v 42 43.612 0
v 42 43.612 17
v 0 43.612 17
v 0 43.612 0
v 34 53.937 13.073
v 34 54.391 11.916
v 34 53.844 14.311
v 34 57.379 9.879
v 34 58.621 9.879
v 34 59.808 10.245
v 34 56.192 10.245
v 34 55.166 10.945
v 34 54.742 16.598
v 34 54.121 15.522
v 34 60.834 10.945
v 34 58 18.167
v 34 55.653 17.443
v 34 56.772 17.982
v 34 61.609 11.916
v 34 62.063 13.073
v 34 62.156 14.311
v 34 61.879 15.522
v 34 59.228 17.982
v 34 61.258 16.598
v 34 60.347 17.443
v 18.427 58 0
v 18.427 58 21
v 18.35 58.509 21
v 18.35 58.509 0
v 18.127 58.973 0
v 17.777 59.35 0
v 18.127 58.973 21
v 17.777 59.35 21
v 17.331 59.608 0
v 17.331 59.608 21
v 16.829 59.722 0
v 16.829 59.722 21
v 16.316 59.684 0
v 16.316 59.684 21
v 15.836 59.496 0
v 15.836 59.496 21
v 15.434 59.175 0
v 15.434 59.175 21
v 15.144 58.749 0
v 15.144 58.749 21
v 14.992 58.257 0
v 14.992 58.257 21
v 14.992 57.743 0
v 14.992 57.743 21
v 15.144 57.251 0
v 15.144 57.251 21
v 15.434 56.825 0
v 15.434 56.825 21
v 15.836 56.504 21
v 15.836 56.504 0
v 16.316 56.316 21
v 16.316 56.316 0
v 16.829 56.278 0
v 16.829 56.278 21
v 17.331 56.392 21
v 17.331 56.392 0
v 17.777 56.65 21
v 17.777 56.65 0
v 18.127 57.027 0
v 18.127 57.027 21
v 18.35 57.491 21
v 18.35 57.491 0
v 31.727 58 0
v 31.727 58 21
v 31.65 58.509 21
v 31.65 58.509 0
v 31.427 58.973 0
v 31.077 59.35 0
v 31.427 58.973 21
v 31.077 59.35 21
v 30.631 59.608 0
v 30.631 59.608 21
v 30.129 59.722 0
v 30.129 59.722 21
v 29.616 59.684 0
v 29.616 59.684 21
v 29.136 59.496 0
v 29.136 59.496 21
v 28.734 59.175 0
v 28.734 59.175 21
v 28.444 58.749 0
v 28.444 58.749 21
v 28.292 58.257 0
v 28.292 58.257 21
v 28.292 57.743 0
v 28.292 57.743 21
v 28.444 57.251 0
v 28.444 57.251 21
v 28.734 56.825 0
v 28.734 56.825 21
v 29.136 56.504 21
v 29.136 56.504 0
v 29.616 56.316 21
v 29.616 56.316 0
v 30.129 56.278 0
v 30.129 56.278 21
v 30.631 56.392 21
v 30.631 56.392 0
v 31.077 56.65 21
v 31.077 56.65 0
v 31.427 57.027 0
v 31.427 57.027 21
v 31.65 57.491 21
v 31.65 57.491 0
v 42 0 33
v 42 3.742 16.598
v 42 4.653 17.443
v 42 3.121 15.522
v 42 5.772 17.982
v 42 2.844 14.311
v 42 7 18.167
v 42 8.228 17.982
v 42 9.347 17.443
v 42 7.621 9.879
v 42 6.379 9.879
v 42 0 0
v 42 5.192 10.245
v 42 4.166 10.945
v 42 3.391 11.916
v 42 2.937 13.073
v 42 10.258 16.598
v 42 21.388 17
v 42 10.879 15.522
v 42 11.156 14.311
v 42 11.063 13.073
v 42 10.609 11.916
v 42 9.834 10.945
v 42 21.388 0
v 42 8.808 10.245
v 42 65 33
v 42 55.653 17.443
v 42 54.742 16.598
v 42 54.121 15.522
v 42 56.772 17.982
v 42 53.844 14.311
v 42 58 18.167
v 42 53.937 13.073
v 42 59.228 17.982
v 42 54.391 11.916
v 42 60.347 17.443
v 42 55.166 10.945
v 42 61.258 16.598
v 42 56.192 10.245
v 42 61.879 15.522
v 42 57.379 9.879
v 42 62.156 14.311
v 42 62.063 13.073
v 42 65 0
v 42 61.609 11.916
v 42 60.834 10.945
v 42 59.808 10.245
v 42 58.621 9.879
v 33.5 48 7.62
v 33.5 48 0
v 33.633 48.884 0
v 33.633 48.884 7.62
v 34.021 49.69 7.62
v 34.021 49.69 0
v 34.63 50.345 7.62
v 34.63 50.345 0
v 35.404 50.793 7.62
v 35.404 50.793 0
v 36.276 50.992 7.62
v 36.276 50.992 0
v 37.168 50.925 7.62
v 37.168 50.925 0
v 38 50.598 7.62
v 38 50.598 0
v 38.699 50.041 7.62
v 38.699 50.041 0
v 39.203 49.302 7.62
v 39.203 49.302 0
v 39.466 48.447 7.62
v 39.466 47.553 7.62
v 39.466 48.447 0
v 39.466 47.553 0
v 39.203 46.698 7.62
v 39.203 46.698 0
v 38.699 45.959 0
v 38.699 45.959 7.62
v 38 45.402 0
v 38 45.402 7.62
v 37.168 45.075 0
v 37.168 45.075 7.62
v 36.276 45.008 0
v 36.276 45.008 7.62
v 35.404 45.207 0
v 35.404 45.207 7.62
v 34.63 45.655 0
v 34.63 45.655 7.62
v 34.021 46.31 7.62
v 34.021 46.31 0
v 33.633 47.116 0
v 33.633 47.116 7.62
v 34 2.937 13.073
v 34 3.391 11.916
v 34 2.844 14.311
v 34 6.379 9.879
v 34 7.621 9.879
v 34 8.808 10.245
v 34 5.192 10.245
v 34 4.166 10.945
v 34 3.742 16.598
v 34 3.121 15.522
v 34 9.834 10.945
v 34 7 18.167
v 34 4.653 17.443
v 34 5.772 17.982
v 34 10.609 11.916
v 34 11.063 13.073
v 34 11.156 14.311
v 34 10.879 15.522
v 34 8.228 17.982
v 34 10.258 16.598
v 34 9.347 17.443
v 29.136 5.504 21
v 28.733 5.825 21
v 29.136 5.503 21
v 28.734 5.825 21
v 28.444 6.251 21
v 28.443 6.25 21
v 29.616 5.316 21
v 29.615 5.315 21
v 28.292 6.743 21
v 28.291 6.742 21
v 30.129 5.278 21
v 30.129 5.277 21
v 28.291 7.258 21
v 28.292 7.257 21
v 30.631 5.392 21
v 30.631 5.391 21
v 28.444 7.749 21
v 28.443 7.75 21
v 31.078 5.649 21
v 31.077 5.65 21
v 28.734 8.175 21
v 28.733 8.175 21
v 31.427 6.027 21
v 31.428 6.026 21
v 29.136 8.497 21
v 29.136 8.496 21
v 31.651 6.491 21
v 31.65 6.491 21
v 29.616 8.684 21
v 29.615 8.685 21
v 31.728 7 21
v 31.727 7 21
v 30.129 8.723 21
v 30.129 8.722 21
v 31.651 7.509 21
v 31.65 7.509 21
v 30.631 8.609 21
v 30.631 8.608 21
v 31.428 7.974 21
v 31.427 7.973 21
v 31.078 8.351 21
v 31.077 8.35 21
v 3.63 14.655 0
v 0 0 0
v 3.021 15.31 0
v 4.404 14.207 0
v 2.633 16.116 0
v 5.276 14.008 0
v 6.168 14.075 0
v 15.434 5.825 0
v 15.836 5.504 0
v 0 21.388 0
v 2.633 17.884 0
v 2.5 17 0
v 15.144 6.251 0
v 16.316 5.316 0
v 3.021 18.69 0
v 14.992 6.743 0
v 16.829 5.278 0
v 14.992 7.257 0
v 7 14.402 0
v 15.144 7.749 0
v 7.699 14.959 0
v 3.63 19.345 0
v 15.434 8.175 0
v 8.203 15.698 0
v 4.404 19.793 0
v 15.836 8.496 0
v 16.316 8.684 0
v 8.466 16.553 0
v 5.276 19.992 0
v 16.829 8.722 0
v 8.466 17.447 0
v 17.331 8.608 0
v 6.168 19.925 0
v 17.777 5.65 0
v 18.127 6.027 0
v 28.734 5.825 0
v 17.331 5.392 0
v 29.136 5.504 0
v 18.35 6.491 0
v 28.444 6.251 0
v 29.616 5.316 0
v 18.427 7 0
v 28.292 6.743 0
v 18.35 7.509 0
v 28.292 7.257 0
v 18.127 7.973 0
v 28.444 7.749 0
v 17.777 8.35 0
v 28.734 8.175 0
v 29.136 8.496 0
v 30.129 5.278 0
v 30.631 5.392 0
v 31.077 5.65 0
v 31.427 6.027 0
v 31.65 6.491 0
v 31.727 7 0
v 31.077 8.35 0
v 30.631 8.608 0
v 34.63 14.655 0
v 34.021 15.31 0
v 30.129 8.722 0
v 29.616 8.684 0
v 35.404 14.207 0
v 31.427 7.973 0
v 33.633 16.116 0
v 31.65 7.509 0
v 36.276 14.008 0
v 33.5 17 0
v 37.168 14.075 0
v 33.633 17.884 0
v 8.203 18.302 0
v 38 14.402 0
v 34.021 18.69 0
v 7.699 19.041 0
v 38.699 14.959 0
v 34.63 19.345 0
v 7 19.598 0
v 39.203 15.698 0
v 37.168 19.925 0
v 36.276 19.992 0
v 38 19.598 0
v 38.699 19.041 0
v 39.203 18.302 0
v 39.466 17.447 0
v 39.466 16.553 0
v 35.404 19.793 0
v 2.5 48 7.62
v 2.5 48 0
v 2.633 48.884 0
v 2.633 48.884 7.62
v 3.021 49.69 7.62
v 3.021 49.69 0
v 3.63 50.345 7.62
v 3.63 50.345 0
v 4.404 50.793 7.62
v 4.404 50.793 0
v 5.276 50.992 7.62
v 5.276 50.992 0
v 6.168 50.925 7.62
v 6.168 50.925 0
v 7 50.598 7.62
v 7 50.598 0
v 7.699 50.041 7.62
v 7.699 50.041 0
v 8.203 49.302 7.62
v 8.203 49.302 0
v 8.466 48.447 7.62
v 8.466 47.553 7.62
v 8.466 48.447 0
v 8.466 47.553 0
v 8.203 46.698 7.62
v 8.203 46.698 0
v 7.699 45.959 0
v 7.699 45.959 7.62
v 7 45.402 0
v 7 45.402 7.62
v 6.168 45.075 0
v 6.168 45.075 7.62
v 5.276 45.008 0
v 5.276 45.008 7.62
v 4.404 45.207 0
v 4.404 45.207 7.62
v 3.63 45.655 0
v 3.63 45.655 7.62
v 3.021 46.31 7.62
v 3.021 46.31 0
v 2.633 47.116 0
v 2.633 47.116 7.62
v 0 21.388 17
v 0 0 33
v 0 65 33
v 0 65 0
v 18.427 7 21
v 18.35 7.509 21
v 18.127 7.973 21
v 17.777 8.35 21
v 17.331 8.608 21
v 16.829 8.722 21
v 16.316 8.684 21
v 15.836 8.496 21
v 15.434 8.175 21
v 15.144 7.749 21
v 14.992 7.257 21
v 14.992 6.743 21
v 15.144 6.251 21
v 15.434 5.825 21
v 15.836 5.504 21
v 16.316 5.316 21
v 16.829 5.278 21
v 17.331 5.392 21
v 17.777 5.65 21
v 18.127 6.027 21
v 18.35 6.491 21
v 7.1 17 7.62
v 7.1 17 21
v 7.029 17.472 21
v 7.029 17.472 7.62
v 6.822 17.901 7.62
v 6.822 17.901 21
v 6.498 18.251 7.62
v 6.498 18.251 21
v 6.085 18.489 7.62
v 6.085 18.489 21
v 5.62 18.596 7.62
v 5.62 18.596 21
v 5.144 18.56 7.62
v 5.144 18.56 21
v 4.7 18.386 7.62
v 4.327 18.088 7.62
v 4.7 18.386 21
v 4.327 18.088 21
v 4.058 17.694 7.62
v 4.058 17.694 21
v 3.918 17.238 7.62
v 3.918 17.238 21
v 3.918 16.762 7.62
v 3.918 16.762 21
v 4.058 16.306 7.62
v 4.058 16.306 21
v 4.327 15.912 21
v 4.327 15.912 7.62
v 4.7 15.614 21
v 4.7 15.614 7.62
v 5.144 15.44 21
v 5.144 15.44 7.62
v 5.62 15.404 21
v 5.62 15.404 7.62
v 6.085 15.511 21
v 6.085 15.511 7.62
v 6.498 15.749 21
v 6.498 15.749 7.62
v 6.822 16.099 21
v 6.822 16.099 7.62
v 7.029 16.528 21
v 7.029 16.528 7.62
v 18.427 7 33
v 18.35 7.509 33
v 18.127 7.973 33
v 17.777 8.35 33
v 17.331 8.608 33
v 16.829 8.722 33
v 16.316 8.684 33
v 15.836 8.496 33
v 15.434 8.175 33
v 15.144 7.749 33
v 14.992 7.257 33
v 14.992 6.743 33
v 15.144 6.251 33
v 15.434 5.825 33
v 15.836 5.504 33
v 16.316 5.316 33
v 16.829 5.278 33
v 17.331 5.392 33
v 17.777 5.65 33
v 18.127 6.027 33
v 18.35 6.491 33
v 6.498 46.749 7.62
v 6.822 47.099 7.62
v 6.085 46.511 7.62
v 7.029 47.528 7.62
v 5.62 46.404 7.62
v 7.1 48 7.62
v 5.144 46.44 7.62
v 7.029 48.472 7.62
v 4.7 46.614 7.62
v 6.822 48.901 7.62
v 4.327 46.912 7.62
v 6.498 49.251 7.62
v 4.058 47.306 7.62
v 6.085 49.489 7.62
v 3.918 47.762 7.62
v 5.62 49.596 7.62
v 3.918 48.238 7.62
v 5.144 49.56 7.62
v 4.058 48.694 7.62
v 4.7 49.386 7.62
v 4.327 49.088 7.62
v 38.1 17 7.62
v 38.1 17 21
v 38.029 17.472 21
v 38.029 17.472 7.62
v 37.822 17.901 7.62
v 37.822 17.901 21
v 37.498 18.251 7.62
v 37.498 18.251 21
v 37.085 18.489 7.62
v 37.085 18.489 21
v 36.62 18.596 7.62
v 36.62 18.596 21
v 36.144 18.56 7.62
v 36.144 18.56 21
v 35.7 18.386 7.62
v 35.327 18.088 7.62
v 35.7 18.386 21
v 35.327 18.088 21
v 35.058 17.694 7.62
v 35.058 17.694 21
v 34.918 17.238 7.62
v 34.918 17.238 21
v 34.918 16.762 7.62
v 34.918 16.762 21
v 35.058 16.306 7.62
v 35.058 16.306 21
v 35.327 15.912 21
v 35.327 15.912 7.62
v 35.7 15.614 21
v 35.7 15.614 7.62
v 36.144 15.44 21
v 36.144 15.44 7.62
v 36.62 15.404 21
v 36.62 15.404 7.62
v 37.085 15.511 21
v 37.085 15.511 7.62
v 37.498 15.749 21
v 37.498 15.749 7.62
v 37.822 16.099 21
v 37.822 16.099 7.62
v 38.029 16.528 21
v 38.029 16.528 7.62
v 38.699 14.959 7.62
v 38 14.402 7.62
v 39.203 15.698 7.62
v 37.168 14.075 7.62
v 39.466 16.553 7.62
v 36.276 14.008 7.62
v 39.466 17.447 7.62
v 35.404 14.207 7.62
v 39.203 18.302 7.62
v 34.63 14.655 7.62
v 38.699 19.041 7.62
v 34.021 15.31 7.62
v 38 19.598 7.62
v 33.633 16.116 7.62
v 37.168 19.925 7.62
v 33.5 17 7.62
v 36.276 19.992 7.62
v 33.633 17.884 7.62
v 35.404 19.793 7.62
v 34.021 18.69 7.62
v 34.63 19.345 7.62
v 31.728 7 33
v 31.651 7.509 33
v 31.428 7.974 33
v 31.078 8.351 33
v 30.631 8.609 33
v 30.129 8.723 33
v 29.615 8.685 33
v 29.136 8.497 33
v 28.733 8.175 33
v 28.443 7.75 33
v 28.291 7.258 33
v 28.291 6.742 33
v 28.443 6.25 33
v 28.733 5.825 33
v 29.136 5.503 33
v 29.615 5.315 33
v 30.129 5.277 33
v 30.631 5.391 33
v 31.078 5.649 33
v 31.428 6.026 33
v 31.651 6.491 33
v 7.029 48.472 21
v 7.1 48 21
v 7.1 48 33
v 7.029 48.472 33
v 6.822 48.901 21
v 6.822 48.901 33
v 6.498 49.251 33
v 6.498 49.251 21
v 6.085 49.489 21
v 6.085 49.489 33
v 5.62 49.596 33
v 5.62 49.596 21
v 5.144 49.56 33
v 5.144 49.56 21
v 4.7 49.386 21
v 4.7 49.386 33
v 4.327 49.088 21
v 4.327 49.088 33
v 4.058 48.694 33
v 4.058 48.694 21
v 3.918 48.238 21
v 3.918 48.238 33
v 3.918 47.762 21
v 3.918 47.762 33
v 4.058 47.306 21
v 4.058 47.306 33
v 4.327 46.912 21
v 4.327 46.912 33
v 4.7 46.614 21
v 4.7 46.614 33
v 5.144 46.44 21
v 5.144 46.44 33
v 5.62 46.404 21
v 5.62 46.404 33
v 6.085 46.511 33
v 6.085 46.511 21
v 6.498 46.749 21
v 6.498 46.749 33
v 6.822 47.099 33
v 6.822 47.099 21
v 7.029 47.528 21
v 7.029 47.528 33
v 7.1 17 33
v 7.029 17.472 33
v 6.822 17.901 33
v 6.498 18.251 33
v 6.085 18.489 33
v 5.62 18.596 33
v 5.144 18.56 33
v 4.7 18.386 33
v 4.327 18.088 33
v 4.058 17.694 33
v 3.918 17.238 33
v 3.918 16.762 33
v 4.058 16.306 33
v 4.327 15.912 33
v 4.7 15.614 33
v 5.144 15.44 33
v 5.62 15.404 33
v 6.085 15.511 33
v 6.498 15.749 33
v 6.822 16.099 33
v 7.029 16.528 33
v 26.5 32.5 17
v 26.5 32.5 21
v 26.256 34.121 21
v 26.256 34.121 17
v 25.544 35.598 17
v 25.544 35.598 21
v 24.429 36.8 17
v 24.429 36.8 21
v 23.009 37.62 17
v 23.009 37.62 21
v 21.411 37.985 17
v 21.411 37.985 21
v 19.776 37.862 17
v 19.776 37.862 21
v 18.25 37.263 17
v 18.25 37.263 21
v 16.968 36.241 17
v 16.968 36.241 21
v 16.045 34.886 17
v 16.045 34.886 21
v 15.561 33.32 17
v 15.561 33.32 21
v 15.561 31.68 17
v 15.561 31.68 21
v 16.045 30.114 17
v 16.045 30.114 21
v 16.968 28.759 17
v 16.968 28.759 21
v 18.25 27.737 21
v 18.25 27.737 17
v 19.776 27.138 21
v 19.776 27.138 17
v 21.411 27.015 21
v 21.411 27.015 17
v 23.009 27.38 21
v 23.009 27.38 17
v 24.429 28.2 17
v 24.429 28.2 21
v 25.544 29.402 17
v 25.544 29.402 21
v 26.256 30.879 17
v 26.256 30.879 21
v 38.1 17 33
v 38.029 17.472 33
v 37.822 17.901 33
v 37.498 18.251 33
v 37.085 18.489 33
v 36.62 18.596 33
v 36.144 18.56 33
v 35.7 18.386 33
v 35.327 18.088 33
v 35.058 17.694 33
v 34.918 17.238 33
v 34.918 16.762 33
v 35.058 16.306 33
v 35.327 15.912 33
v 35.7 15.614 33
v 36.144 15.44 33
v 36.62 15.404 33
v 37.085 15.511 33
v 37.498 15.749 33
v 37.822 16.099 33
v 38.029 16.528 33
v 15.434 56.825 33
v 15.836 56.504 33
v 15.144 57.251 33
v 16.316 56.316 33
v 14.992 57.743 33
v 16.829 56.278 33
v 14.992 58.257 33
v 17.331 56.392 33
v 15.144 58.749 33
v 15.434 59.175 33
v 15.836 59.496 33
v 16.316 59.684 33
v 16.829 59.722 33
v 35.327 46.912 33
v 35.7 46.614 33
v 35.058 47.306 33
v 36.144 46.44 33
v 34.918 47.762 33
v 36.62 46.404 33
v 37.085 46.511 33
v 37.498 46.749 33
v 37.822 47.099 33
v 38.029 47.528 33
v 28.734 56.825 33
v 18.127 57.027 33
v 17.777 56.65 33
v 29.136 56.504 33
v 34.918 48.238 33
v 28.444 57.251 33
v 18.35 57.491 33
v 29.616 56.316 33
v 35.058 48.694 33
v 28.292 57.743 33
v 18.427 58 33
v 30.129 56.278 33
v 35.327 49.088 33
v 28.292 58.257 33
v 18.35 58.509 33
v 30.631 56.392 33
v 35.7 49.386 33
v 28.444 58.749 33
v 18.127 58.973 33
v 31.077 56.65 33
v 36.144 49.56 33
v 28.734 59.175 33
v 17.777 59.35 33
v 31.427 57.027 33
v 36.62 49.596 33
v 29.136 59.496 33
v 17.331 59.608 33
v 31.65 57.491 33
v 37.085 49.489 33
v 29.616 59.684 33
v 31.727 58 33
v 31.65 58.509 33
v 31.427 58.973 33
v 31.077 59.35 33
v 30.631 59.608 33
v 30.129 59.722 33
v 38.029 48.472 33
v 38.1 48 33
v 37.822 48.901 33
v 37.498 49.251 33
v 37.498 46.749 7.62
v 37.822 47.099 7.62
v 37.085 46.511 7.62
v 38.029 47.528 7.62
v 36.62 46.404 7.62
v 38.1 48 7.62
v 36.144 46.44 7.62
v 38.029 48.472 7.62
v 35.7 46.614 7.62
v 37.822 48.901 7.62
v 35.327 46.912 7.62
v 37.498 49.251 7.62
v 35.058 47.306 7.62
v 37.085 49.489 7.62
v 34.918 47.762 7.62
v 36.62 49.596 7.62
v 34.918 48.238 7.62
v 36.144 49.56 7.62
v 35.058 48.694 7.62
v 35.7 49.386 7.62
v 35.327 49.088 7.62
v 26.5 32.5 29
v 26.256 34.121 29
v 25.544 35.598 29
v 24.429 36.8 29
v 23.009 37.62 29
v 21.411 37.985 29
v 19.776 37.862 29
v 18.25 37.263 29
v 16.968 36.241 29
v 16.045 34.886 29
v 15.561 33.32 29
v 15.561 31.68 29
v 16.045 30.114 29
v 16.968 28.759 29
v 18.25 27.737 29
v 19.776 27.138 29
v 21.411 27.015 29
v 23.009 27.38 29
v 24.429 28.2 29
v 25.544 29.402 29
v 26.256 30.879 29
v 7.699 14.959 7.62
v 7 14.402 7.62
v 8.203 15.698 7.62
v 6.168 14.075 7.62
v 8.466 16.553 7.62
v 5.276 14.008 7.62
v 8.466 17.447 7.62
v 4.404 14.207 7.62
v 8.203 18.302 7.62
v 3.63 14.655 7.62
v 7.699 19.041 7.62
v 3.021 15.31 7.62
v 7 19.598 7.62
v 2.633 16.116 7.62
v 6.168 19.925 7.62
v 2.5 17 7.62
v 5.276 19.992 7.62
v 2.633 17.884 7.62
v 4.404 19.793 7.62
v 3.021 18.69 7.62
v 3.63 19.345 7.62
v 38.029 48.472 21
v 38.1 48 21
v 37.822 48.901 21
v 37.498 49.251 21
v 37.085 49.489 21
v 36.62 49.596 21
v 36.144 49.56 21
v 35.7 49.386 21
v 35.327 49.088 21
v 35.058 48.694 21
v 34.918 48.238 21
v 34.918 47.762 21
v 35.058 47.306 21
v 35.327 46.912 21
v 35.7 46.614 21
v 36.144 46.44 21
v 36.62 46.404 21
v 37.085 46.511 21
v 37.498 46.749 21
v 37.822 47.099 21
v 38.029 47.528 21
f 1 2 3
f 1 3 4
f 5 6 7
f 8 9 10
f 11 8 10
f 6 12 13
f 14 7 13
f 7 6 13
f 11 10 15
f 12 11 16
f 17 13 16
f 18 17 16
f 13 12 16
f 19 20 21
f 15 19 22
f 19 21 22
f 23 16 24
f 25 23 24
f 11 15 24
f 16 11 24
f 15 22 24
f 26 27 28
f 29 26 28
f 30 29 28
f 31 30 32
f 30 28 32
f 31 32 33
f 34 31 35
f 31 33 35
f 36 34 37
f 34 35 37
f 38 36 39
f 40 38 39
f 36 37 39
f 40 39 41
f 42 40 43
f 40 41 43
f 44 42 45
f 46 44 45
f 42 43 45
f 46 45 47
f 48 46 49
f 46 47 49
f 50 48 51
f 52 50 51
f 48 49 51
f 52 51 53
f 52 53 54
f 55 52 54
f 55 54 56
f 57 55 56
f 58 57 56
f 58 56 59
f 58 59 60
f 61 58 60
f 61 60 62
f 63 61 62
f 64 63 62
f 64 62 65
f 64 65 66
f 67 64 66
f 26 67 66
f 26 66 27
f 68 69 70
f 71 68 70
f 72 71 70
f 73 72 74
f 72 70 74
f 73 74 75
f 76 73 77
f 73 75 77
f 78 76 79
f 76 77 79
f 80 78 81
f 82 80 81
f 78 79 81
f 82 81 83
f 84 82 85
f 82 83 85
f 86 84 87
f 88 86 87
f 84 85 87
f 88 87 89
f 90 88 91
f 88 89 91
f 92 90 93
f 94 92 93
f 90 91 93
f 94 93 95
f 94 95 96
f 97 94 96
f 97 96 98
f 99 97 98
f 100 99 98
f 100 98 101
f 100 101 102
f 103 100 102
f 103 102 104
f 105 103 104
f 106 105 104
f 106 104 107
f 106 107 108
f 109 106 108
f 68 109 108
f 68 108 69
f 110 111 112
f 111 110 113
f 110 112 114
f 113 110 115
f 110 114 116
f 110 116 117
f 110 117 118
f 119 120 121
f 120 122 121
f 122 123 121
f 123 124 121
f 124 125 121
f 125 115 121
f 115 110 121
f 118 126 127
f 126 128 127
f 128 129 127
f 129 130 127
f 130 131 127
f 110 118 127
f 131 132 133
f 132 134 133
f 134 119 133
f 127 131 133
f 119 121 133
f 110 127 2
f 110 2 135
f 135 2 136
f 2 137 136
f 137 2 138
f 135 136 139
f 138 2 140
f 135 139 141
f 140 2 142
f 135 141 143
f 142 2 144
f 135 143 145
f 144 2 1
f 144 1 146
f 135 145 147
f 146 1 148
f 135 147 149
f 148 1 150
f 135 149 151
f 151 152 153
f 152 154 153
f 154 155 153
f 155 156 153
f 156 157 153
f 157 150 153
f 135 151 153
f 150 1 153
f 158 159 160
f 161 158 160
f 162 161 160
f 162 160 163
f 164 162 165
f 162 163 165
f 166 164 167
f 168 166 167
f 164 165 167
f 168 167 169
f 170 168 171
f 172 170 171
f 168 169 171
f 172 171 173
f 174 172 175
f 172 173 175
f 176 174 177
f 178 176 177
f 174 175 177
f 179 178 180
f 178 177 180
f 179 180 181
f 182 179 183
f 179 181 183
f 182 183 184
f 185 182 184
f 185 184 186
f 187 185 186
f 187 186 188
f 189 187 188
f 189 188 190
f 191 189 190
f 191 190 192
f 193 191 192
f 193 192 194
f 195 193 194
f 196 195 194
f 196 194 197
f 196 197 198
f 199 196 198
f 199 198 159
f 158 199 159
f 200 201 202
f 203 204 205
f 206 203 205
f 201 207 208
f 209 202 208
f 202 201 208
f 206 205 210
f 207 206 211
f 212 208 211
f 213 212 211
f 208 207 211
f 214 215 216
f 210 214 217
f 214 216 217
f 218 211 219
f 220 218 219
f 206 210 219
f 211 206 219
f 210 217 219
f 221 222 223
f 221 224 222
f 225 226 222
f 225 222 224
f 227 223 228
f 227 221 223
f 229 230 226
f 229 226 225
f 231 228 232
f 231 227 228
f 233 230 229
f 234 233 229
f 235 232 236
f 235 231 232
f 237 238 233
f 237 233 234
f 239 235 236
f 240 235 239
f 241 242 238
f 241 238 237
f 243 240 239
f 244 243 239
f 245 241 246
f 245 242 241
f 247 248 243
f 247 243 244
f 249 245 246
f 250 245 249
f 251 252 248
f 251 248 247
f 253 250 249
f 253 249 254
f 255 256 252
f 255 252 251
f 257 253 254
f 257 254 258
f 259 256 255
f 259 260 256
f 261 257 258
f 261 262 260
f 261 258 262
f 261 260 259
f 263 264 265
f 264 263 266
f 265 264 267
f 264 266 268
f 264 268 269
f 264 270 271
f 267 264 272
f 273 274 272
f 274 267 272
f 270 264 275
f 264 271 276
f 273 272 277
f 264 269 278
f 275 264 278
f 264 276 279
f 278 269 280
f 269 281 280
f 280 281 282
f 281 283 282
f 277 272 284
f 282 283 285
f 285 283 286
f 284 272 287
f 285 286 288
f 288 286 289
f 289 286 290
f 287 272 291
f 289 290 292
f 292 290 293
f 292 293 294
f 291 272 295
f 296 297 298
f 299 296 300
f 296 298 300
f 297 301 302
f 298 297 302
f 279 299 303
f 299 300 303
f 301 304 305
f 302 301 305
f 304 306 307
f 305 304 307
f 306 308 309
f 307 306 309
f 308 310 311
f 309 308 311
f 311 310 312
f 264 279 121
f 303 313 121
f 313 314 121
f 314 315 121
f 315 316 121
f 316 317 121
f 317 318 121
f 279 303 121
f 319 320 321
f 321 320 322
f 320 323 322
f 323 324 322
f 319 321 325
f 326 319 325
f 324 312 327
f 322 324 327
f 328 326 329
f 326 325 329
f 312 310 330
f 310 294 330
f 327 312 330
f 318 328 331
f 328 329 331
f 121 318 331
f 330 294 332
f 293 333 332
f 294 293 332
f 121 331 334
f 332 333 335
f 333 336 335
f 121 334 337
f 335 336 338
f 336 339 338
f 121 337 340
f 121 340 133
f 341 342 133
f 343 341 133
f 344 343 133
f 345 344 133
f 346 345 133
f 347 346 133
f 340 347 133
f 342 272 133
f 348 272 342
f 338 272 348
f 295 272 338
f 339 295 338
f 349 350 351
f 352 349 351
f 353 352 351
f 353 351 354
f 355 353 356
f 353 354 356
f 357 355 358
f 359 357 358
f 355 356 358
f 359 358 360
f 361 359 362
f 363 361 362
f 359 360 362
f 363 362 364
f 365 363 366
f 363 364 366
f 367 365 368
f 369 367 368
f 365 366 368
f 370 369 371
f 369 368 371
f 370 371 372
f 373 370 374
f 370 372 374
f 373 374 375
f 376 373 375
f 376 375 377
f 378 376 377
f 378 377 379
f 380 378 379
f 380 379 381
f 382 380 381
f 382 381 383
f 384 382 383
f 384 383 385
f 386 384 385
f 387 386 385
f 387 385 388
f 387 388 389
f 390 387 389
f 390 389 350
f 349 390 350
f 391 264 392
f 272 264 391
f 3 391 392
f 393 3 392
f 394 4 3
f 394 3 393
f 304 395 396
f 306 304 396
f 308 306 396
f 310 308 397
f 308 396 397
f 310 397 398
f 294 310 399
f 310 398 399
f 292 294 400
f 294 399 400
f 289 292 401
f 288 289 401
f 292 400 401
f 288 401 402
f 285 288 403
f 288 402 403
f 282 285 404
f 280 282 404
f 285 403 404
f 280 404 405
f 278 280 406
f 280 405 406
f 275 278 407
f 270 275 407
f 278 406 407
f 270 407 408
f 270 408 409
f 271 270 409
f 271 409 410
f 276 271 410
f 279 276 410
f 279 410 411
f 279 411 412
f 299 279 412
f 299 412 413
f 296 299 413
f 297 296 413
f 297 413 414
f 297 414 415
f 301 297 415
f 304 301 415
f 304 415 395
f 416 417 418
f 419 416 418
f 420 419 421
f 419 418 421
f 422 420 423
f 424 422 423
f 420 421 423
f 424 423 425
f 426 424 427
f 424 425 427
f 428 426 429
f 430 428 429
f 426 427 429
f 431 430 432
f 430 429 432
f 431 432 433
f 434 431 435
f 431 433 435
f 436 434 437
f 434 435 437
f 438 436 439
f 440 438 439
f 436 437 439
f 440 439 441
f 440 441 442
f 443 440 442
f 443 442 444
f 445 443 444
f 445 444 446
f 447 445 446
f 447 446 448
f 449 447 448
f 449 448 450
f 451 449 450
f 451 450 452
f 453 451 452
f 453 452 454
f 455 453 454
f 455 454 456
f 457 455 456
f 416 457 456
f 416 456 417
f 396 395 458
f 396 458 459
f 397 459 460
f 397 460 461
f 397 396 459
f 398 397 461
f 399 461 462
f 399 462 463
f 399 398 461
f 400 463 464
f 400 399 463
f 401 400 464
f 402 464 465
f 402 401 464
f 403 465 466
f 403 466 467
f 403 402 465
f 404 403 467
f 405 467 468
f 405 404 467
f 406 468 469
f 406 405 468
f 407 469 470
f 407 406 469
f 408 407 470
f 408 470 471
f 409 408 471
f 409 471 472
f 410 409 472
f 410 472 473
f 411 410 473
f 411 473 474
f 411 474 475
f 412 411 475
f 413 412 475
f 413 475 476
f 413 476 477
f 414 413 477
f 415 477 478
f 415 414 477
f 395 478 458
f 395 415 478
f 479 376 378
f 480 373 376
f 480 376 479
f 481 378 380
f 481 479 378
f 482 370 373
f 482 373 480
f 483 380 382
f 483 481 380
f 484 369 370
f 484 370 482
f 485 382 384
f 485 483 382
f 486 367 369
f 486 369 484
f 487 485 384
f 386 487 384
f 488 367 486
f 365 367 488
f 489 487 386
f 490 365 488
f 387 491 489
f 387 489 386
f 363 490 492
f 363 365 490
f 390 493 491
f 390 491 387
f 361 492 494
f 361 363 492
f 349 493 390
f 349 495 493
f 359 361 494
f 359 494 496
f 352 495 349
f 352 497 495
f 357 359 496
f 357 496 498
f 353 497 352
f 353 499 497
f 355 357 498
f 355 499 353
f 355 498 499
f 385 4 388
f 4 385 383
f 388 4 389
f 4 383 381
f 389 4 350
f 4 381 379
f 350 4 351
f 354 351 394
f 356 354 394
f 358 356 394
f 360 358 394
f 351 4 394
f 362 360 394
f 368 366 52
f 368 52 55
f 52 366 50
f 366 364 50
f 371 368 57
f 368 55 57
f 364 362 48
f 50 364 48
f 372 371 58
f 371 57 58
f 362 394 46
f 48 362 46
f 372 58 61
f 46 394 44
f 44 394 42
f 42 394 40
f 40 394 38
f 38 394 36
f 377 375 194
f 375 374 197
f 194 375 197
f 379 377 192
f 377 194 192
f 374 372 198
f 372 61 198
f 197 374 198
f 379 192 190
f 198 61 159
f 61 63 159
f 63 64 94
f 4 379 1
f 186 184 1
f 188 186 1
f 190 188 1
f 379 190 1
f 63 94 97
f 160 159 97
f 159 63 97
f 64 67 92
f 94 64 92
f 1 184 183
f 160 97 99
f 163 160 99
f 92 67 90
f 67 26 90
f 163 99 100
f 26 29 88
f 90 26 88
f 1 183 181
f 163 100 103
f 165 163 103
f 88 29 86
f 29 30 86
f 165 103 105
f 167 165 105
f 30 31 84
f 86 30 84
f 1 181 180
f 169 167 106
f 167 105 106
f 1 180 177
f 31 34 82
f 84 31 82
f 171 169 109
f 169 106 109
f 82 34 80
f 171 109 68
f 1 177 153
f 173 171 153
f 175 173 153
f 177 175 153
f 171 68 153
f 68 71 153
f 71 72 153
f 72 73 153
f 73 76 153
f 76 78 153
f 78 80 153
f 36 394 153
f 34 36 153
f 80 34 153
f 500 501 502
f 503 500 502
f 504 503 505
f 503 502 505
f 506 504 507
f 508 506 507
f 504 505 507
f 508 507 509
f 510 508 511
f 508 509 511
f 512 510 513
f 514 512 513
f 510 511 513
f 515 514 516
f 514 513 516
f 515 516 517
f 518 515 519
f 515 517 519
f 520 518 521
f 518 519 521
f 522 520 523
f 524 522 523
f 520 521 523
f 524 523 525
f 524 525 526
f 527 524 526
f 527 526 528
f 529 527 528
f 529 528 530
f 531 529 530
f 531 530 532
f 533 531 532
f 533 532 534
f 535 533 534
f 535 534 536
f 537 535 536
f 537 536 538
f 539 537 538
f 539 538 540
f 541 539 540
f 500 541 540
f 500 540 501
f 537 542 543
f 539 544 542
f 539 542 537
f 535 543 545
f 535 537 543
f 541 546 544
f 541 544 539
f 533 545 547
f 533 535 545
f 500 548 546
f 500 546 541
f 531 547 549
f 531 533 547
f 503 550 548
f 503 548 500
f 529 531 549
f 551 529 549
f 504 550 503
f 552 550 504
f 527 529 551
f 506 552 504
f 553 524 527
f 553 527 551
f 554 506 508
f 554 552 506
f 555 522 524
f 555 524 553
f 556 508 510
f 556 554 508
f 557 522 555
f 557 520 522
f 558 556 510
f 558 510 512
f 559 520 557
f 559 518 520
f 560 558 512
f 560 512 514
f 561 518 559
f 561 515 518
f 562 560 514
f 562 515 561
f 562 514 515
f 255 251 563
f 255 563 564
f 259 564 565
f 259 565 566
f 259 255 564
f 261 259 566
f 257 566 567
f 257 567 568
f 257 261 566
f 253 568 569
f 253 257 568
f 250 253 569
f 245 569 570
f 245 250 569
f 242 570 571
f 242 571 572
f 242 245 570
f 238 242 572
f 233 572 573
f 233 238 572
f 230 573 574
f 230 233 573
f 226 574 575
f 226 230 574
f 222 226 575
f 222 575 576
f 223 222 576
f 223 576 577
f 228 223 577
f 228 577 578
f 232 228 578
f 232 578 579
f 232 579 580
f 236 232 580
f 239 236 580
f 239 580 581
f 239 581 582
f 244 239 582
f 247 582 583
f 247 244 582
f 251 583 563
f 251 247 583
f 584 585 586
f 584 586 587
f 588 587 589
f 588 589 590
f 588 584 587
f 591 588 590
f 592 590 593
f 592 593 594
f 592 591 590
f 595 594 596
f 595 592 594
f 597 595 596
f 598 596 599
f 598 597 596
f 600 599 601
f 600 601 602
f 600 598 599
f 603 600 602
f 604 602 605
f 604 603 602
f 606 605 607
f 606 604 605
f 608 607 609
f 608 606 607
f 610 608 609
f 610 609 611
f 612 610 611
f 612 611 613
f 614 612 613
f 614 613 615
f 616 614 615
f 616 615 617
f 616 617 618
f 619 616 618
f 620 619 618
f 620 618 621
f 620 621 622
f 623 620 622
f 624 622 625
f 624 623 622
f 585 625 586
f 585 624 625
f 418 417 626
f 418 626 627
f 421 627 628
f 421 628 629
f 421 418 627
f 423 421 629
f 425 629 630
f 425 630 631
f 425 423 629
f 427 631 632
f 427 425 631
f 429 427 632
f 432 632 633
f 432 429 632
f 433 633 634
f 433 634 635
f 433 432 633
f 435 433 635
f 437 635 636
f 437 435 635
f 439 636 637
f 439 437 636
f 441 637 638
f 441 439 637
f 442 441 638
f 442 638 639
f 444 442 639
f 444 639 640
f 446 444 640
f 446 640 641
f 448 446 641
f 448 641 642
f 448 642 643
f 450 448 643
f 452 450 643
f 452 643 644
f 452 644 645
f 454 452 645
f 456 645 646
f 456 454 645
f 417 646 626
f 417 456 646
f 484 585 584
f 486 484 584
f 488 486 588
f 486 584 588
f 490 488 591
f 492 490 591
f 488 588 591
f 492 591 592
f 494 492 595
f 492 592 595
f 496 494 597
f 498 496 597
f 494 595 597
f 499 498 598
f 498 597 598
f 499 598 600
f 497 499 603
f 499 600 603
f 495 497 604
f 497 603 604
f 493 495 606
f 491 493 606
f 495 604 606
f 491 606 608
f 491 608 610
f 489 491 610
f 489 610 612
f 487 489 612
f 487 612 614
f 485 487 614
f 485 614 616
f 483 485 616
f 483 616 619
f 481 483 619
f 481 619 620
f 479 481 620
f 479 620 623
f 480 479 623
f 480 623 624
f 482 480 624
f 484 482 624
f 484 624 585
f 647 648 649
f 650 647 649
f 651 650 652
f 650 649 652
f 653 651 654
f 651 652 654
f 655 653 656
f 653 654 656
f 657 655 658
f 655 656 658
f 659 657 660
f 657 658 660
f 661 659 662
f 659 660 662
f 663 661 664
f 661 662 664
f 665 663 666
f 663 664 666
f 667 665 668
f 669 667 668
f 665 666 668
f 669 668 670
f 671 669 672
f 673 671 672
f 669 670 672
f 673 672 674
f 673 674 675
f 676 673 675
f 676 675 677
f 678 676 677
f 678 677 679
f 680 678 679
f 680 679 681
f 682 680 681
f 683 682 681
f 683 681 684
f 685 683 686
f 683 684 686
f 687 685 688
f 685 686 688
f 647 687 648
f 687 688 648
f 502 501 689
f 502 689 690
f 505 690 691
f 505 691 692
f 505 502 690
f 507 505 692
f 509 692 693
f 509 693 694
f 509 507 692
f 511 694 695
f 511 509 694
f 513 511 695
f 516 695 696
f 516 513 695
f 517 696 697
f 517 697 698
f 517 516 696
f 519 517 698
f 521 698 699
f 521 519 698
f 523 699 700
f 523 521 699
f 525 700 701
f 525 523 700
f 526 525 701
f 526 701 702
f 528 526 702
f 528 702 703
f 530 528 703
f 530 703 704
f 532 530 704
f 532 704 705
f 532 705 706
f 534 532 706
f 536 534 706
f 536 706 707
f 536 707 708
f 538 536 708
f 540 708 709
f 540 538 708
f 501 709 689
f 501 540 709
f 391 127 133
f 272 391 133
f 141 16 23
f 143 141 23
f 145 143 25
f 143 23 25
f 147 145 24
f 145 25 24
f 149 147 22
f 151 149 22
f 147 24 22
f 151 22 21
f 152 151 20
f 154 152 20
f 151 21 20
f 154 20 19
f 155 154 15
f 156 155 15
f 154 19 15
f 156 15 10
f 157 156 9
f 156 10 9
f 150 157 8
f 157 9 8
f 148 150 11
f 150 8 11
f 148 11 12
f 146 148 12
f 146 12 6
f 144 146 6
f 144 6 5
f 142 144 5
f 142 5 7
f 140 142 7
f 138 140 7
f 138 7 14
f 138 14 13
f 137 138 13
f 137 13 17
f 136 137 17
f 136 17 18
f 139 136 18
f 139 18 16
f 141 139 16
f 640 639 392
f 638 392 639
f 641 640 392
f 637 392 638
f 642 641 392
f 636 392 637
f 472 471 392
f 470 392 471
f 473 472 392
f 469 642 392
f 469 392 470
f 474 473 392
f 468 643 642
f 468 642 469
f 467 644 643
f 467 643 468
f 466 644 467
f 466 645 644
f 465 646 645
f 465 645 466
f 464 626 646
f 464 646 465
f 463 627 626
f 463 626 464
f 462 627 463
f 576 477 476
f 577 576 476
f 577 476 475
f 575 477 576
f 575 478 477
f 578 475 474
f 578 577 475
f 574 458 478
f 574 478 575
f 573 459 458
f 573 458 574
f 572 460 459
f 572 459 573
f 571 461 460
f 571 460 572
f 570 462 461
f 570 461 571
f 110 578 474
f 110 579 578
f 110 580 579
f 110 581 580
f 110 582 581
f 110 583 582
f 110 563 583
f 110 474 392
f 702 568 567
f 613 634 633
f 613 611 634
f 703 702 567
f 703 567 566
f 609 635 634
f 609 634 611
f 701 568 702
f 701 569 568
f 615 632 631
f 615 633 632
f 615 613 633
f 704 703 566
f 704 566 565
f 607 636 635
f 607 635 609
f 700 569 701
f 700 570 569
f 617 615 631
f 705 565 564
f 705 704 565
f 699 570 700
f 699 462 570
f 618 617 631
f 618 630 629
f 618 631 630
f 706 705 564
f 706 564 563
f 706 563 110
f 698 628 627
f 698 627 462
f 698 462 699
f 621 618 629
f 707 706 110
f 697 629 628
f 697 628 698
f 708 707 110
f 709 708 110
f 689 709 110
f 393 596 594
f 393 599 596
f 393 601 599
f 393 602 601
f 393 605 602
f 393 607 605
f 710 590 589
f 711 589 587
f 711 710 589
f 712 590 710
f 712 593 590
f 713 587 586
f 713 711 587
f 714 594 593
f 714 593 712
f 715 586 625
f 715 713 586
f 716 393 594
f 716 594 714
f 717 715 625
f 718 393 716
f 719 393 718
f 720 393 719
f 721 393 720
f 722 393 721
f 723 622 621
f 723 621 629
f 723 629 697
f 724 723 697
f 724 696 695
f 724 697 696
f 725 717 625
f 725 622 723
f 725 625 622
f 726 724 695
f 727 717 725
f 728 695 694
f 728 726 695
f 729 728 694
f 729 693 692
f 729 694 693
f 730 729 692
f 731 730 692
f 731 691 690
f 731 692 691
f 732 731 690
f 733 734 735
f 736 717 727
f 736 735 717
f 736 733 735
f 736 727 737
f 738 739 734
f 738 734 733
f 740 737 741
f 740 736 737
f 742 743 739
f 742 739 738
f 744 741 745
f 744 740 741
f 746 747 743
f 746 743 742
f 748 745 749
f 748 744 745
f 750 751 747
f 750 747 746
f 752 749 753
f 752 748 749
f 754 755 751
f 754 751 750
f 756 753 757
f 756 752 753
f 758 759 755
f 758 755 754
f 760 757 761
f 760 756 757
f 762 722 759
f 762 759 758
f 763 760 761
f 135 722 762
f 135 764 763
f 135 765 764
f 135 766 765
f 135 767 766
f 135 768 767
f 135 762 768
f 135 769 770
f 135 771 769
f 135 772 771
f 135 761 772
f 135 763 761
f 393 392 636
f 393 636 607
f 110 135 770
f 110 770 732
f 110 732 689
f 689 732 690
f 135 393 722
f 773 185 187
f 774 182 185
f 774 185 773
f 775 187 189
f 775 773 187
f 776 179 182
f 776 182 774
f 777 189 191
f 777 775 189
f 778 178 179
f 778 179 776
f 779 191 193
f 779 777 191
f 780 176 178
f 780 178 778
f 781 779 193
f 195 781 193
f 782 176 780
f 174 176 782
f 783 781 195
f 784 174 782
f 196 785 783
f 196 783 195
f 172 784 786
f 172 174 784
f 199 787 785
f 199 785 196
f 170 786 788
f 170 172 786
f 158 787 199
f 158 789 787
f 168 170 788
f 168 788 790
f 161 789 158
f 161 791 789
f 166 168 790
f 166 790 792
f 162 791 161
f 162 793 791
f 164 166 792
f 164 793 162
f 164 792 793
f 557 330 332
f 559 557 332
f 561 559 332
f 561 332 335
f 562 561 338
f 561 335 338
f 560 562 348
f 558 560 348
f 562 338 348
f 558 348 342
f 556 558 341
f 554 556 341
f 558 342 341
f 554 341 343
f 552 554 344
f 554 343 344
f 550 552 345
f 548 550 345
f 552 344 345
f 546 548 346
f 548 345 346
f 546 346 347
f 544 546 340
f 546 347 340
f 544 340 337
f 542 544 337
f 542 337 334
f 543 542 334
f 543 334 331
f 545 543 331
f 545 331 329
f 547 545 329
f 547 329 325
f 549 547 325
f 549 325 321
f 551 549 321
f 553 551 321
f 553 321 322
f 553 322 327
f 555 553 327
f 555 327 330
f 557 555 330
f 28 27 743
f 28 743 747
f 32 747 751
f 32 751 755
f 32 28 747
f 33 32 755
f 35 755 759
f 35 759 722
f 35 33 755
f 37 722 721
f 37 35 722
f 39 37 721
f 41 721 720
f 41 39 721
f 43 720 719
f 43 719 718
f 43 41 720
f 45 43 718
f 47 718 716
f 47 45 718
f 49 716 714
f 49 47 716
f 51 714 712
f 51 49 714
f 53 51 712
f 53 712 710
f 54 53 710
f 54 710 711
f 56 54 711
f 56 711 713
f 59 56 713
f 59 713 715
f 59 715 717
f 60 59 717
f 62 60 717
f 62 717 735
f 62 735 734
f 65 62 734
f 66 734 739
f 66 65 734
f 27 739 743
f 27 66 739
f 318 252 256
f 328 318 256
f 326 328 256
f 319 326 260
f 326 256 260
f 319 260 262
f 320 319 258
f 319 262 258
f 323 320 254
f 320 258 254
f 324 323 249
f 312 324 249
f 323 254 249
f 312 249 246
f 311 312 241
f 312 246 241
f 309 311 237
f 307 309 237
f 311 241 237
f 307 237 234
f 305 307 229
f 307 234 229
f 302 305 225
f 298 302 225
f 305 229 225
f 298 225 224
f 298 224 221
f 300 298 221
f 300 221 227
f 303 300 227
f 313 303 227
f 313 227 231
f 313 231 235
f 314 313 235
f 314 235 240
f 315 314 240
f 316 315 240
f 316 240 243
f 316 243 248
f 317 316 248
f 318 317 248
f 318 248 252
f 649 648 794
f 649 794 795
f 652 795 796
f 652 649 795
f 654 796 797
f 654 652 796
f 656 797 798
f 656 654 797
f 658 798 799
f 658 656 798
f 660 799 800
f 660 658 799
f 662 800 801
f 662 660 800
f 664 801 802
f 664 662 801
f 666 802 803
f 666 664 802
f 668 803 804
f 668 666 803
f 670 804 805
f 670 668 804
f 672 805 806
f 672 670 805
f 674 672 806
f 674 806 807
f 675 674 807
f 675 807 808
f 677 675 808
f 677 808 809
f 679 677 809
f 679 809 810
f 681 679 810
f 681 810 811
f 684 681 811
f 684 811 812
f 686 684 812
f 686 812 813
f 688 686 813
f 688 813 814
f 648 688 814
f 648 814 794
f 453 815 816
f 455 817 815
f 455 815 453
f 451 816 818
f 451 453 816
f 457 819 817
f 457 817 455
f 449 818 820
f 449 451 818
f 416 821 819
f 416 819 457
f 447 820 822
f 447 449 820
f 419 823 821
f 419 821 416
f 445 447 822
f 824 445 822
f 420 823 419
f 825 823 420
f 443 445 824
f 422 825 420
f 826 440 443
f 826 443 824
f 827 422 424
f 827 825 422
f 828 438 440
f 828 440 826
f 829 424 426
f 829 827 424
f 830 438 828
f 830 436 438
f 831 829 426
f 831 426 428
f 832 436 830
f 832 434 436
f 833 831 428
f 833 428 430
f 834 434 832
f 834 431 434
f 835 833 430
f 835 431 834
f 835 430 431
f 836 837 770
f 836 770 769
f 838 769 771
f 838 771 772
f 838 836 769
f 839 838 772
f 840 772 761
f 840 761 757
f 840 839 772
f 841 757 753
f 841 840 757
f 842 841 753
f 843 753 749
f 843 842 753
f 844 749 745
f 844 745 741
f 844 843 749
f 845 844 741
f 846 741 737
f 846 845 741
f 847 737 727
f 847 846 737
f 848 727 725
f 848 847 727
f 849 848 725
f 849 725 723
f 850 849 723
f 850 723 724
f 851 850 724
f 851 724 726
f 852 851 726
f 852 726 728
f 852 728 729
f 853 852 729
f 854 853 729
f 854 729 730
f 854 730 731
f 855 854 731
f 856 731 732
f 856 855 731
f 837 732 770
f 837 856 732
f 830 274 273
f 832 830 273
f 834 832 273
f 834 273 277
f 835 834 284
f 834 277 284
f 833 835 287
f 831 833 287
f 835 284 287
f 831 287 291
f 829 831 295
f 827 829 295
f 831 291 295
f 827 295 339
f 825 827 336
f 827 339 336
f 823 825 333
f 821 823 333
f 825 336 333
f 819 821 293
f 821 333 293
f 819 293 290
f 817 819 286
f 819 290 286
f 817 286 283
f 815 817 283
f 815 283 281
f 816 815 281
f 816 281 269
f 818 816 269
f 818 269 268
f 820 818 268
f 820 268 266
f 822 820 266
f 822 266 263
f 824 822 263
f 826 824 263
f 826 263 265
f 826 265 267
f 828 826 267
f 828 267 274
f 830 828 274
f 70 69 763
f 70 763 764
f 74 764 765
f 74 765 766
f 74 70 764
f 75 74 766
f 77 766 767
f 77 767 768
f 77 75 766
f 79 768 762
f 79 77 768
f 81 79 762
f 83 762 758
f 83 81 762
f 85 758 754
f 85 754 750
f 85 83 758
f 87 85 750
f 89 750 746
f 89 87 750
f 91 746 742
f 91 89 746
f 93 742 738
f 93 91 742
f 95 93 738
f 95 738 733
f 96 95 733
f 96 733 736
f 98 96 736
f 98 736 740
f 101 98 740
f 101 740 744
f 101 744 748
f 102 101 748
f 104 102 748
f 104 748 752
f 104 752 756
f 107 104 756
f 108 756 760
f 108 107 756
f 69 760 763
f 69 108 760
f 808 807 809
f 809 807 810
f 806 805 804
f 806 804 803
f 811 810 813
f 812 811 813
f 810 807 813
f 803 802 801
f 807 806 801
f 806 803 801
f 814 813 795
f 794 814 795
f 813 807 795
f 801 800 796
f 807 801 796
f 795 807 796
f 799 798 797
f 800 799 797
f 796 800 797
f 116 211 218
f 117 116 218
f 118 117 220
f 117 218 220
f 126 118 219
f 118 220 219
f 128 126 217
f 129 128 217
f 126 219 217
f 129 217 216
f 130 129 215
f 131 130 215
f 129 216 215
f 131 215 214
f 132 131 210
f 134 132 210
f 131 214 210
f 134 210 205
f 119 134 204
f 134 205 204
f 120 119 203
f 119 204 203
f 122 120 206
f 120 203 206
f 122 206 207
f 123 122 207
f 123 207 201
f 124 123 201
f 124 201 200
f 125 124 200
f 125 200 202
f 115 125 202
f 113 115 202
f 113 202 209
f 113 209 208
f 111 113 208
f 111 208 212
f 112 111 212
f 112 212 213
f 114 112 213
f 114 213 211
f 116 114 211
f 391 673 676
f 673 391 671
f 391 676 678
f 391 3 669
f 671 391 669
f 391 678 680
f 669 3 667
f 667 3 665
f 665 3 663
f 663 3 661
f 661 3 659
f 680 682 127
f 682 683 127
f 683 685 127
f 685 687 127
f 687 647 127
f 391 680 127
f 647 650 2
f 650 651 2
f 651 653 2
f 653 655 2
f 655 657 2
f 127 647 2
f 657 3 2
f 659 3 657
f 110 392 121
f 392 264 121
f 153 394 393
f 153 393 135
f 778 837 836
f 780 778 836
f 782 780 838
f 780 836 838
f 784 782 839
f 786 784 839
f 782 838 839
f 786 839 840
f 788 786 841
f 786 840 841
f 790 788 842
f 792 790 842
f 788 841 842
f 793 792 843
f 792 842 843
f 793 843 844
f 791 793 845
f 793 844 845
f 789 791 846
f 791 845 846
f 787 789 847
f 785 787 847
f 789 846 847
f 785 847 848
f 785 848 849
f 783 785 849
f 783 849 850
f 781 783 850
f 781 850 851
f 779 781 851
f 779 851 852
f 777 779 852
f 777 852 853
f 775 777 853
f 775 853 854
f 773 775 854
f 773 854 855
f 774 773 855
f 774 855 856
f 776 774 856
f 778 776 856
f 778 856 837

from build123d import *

# Parameters (mm, degrees)
ESBO_O1_W                                            = 42
ESBO_O1_H                                            = 65
RESSALTO_EXTRUS_O1_DEPTH                             = 21
ESBO_O2_W                                            = 17
ESBO_O2_H                                            = 22.225
CORTE_EXTRUS_O1_DEPTH                                = 43
FURO_COM_FOLGA_DE_M31_D                              = 3.4544
FURO_COM_FOLGA_DE_M31_DEPTH                          = 21
FURO_COM_FOLGA_DE_M201_D                             = 22.225
FURO_COM_FOLGA_DE_M201_DEPTH                         = 21
REBAIXO_PARA_PARAFUSO_DE_M_QUINA_DE_CABE_D           = 3.2
REBAIXO_PARA_PARAFUSO_DE_M_QUINA_DE_CABE_DEPTH       = 21
REBAIXO_PARA_PARAFUSO_DE_M_QUINA_DE_CABE_CBORE_D     = 6
REBAIXO_PARA_PARAFUSO_DE_M_QUINA_DE_CABE_CBORE_DEPTH = 7.62
FURO1_D                                              = 8.334375
FURO1_DEPTH                                          = 8
ESBO_O11_R                                           = 11.1125
ESBO_O11_R_2                                         = 5.5
RESSALTO_EXTRUS_O2_DEPTH                             = 4
ESBO_O12_W                                           = 42
ESBO_O12_H                                           = 65
ESBO_O12_R                                           = 5.5
ESBO_O12_R_2                                         = 1.6
ESBO_O12_R_3                                         = 1.7272
ESBO_O12_R_4                                         = 1.728196919
RESSALTO_EXTRUS_O3_DEPTH                             = 12
ESBO_O14_R                                           = 5.5
RESSALTO_EXTRUS_O4_DEPTH                             = 4


with BuildPart() as part:
    # Esboço1 → Ressalto-extrusão1 (new body)
    with BuildSketch(Plane.XY.offset(21)):
        with Locations((21, 32.5)):
            Rectangle(ESBO_O1_W, ESBO_O1_H)
    extrude(amount=-RESSALTO_EXTRUS_O1_DEPTH)

    # Esboço2 → Corte-extrusão1 (cut, through all)
    with BuildSketch(Plane(origin=(42, 0, 0), x_dir=(0, 0, -1), z_dir=(1, 0, 0))):
        with Locations((-8.5, 32.5)):
            Rectangle(ESBO_O2_W, ESBO_O2_H)
    extrude(amount=-CORTE_EXTRUS_O1_DEPTH, mode=Mode.SUBTRACT)

    # Furo com folga de M31
    with Locations(Plane(origin=(0, 0, 0), x_dir=(-1, 0, 0), z_dir=(0, 0, -1))):
        with Locations((-30, 7), (-16.7, 7), (-16.7, 58), (-30, 58)):
            Hole(FURO_COM_FOLGA_DE_M31_D / 2, depth=FURO_COM_FOLGA_DE_M31_DEPTH)

    # Furo com folga de M201
    with Locations(Plane.XY.offset(21)):
        with Locations((21, 32.5)):
            Hole(FURO_COM_FOLGA_DE_M201_D / 2, depth=FURO_COM_FOLGA_DE_M201_DEPTH)

    # Rebaixo para parafuso de máquina de cabeça sextavada de M31
    with Locations(Plane(origin=(0, 0, 0), x_dir=(-1, 0, 0), z_dir=(0, 0, -1))):
        with Locations((-36.5, 17), (-5.5, 17), (-5.5, 48), (-36.5, 48)):
            CounterBoreHole(REBAIXO_PARA_PARAFUSO_DE_M_QUINA_DE_CABE_D / 2, REBAIXO_PARA_PARAFUSO_DE_M_QUINA_DE_CABE_CBORE_D / 2, REBAIXO_PARA_PARAFUSO_DE_M_QUINA_DE_CABE_CBORE_DEPTH, depth=REBAIXO_PARA_PARAFUSO_DE_M_QUINA_DE_CABE_DEPTH)

    # Furo1
    with Locations(Plane(origin=(42, 0, 0), x_dir=(0, 0, -1), z_dir=(1, 0, 0))):
        with Locations((-14, 7), (-14, 58)):
            Hole(FURO1_D / 2, depth=FURO1_DEPTH)

    # Esboço11 → Ressalto-extrusão2 (add)
    with BuildSketch(Plane.XY.offset(21)):
        with Locations((21, 32.5)):
            Circle(ESBO_O11_R)
        with Locations((21, 32.5)):
            Circle(ESBO_O11_R_2, mode=Mode.SUBTRACT)
    extrude(amount=-RESSALTO_EXTRUS_O2_DEPTH)

    # Esboço12 → Ressalto-extrusão3 (add)
    with BuildSketch(Plane.XY.offset(21)):
        with Locations((21, 32.5)):
            Rectangle(ESBO_O12_W, ESBO_O12_H)
        with Locations((21, 32.5)):
            Circle(ESBO_O12_R, mode=Mode.SUBTRACT)
        with Locations((5.5, 48)):
            Circle(ESBO_O12_R_2, mode=Mode.SUBTRACT)
        with Locations((16.7, 58)):
            Circle(ESBO_O12_R_3, mode=Mode.SUBTRACT)
        with Locations((30, 58)):
            Circle(ESBO_O12_R_3, mode=Mode.SUBTRACT)
        with Locations((36.5, 48)):
            Circle(ESBO_O12_R_2, mode=Mode.SUBTRACT)
        with Locations((36.5, 17)):
            Circle(ESBO_O12_R_2, mode=Mode.SUBTRACT)
        with Locations((5.5, 17)):
            Circle(ESBO_O12_R_2, mode=Mode.SUBTRACT)
        with Locations((16.7, 7)):
            Circle(ESBO_O12_R_3, mode=Mode.SUBTRACT)
        with Locations((30, 7)):
            Circle(ESBO_O12_R_4, mode=Mode.SUBTRACT)
    extrude(amount=RESSALTO_EXTRUS_O3_DEPTH)

    # Esboço14 → Ressalto-extrusão4 (add)
    with BuildSketch(Plane.XY.offset(33)):
        with Locations((21, 32.5)):
            Circle(ESBO_O14_R)
    extrude(amount=-RESSALTO_EXTRUS_O4_DEPTH)


solid = part.part
